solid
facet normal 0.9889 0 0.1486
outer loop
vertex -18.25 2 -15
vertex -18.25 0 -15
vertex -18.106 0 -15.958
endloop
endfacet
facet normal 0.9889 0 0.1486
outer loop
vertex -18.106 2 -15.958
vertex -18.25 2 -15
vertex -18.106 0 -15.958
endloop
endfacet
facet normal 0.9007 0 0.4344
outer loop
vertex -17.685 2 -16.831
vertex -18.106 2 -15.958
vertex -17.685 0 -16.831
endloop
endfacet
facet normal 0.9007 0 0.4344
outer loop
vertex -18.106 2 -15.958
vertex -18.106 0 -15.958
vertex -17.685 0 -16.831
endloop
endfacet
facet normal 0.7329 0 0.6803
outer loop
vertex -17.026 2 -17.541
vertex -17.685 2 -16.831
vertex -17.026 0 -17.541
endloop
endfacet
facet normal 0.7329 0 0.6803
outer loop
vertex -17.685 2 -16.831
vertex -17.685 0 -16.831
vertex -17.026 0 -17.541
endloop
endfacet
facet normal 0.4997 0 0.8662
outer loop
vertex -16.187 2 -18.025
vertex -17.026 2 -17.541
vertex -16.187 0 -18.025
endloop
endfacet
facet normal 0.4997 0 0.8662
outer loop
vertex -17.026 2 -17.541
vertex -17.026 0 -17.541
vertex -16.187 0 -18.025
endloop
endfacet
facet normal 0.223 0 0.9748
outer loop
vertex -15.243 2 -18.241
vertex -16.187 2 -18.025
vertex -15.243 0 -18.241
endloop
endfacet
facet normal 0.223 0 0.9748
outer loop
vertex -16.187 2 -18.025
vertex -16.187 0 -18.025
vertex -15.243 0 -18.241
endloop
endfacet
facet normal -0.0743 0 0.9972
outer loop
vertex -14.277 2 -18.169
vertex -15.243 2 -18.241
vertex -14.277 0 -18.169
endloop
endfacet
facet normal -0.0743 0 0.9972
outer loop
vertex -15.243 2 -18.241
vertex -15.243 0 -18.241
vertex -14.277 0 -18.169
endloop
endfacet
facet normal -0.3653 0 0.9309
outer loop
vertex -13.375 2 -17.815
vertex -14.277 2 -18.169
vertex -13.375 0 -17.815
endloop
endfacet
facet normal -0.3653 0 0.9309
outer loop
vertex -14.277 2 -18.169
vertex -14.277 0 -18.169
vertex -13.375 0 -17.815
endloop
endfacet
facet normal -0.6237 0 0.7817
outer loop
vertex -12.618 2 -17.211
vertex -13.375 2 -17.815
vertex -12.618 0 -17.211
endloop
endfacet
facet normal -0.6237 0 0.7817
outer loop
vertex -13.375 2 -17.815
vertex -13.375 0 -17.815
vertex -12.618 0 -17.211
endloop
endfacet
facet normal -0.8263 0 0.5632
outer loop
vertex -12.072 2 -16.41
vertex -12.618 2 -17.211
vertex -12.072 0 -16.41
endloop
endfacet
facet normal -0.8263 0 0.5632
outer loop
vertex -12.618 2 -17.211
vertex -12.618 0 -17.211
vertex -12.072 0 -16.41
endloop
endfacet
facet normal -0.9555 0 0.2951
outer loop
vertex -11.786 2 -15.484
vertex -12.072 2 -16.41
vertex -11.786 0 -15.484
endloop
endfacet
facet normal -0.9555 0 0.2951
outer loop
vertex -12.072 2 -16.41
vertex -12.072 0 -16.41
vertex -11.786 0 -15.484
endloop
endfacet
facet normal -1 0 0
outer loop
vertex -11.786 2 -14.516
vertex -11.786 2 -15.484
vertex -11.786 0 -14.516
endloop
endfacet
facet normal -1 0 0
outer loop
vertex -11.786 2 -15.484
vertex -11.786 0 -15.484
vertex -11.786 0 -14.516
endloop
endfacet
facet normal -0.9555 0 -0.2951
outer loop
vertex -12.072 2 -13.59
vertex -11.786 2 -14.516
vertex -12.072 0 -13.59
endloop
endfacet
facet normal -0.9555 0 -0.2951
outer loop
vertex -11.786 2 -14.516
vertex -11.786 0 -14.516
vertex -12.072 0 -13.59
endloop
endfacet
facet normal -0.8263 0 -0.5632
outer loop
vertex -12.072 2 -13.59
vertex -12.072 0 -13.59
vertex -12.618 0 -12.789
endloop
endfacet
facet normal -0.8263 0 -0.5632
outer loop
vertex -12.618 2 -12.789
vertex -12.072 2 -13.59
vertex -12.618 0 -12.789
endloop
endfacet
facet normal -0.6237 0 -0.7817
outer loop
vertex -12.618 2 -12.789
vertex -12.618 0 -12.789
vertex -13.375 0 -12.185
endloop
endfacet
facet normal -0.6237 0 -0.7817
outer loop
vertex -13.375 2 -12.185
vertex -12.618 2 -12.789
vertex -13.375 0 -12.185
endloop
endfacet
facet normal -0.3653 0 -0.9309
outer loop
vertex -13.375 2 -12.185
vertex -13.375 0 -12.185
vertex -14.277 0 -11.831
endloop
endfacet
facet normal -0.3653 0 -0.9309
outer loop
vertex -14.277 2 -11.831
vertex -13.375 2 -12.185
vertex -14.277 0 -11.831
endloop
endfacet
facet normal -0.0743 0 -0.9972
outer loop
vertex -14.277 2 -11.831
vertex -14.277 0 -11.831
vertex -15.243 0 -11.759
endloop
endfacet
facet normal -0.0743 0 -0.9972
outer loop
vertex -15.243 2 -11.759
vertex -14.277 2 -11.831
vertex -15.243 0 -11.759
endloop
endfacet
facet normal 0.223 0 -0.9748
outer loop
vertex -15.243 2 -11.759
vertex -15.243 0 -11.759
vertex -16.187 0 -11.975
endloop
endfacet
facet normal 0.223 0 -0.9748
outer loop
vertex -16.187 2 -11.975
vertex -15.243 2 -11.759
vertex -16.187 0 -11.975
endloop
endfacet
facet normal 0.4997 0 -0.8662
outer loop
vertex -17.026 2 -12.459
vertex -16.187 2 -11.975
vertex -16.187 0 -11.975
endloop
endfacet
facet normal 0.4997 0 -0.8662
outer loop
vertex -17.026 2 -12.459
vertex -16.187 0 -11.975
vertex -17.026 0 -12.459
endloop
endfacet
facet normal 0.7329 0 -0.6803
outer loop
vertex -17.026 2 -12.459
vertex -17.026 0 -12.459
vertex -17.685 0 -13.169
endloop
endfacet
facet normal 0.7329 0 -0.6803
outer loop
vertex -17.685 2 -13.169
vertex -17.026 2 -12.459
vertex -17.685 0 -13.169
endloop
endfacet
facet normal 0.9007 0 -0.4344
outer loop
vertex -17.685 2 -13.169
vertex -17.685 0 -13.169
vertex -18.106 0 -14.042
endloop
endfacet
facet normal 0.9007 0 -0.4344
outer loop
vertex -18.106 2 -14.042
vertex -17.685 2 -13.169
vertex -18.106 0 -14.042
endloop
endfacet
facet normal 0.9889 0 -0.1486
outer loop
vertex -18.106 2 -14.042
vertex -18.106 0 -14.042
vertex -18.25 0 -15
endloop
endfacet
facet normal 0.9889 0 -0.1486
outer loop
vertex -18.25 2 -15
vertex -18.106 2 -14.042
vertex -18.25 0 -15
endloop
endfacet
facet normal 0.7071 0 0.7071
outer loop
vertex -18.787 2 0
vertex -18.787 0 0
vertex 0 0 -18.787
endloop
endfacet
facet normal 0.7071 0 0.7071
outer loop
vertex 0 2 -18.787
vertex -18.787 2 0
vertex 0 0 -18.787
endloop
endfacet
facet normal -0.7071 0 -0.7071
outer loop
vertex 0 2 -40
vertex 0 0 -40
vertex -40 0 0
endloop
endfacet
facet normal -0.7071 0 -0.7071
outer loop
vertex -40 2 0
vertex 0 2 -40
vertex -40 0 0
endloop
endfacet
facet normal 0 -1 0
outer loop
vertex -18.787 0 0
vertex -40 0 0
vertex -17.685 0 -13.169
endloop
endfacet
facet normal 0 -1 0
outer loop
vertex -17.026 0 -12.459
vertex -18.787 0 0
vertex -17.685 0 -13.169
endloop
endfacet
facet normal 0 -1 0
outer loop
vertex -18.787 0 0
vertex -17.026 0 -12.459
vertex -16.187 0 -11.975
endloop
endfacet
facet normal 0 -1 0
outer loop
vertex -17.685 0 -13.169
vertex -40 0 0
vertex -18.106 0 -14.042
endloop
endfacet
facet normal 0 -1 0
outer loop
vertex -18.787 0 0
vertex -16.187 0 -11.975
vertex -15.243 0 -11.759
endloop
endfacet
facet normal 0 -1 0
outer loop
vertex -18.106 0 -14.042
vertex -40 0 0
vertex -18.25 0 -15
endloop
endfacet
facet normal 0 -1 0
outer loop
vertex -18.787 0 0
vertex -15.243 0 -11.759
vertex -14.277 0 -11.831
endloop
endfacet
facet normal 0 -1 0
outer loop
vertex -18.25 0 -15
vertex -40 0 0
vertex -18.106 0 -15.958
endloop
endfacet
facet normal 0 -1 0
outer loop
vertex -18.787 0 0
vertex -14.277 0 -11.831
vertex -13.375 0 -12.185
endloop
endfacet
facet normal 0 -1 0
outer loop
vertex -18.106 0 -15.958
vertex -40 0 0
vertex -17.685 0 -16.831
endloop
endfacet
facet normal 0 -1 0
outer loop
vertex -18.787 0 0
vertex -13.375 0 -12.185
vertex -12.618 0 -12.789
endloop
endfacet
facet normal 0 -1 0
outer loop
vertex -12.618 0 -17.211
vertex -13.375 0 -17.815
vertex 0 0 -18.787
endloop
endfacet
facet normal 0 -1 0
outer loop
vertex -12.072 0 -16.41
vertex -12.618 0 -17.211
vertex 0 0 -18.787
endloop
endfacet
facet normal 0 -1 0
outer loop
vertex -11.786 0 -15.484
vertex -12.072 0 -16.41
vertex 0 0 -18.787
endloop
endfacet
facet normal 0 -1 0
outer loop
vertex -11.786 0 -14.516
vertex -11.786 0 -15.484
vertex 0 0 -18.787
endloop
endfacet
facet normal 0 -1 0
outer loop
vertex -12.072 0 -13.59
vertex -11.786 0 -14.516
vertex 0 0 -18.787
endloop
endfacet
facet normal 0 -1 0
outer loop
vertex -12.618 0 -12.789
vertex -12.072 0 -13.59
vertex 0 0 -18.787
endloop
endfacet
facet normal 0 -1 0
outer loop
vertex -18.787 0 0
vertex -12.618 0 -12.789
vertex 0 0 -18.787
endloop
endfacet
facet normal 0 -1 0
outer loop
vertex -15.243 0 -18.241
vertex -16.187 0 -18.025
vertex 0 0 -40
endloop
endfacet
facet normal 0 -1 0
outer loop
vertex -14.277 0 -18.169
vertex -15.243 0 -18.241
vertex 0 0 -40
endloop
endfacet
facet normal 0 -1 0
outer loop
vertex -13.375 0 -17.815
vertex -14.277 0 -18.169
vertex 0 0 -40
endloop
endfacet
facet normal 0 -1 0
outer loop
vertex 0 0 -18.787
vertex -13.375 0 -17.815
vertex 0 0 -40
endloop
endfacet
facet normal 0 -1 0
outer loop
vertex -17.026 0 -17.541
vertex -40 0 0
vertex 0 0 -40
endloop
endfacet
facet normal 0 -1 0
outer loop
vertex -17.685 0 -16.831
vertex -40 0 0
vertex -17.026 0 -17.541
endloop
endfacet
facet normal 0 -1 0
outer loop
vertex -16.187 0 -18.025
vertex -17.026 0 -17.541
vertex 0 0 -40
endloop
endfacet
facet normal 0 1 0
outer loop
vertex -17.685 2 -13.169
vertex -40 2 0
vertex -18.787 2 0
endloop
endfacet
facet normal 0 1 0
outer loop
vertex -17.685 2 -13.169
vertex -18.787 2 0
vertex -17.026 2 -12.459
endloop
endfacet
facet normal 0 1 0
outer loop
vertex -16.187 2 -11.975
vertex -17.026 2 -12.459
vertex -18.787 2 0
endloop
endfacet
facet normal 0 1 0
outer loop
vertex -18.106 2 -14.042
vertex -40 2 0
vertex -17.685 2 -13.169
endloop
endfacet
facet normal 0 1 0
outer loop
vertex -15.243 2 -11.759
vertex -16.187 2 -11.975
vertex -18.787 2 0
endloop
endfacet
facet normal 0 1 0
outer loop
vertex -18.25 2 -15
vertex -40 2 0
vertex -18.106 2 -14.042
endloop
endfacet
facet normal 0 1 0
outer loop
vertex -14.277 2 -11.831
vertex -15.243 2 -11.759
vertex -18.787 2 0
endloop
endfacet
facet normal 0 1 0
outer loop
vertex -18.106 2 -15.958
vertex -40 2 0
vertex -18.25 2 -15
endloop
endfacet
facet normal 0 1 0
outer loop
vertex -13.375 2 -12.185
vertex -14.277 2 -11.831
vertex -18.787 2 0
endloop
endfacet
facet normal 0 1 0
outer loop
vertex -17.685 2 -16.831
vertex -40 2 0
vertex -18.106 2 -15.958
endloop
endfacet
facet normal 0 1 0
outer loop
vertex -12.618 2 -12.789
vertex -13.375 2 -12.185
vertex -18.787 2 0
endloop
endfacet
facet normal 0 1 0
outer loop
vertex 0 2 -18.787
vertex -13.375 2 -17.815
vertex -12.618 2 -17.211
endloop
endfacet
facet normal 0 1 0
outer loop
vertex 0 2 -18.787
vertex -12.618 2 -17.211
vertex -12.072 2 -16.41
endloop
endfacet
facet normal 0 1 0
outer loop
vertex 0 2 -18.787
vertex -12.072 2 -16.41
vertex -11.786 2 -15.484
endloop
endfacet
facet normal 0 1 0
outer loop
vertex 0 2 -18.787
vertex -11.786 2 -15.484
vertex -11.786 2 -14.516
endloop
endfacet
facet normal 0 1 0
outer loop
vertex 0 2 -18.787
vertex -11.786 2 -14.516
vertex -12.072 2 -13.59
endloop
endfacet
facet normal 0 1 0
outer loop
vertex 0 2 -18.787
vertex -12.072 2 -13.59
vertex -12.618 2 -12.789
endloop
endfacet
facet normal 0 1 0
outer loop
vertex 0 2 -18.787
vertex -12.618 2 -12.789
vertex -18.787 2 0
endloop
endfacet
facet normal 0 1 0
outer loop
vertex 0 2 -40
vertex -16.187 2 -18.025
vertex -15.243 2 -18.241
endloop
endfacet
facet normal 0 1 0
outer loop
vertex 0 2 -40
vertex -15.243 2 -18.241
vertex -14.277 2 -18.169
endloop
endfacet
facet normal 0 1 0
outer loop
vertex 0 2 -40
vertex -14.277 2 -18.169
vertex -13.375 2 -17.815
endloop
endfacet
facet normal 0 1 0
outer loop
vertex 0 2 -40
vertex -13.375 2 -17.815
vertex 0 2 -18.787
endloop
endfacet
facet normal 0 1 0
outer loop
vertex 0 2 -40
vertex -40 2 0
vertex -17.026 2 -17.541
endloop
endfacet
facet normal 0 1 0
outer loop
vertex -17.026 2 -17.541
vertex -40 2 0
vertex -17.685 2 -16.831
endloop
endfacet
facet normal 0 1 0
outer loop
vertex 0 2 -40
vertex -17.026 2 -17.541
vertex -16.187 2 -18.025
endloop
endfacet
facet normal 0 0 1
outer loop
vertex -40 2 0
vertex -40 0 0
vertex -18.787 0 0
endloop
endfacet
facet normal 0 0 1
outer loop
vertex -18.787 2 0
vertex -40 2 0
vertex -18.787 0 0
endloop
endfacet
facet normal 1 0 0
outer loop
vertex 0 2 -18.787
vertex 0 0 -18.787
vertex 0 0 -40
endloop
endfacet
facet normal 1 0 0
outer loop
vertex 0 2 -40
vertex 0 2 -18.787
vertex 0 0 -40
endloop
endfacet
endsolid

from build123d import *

# Parameters (mm, degrees)
EXTRUDE1_DEPTH                 = 2
F_6_5_6_5_DIAMETER_HOLE1_D     = 6.5
F_6_5_6_5_DIAMETER_HOLE1_DEPTH = 2


with BuildPart() as part:
    # Sketch1 → Extrude1 (new body)
    with BuildSketch(Plane(origin=(0, 0, 0), x_dir=(1, 0, 0), z_dir=(0, 1, 0))):
        Polygon((-40, 0), (-18.786796564, 0), (0, 18.786796564), (0, 40), align=None)
    extrude(amount=EXTRUDE1_DEPTH)

    # Ø6.5 (6.5) Diameter Hole1
    with Locations(Plane(origin=(0, 2, 0), x_dir=(1, 0, 0), z_dir=(0, 1, 0))):
        with Locations((-15, 15)):
            Hole(F_6_5_6_5_DIAMETER_HOLE1_D / 2, depth=F_6_5_6_5_DIAMETER_HOLE1_DEPTH)


solid = part.part
